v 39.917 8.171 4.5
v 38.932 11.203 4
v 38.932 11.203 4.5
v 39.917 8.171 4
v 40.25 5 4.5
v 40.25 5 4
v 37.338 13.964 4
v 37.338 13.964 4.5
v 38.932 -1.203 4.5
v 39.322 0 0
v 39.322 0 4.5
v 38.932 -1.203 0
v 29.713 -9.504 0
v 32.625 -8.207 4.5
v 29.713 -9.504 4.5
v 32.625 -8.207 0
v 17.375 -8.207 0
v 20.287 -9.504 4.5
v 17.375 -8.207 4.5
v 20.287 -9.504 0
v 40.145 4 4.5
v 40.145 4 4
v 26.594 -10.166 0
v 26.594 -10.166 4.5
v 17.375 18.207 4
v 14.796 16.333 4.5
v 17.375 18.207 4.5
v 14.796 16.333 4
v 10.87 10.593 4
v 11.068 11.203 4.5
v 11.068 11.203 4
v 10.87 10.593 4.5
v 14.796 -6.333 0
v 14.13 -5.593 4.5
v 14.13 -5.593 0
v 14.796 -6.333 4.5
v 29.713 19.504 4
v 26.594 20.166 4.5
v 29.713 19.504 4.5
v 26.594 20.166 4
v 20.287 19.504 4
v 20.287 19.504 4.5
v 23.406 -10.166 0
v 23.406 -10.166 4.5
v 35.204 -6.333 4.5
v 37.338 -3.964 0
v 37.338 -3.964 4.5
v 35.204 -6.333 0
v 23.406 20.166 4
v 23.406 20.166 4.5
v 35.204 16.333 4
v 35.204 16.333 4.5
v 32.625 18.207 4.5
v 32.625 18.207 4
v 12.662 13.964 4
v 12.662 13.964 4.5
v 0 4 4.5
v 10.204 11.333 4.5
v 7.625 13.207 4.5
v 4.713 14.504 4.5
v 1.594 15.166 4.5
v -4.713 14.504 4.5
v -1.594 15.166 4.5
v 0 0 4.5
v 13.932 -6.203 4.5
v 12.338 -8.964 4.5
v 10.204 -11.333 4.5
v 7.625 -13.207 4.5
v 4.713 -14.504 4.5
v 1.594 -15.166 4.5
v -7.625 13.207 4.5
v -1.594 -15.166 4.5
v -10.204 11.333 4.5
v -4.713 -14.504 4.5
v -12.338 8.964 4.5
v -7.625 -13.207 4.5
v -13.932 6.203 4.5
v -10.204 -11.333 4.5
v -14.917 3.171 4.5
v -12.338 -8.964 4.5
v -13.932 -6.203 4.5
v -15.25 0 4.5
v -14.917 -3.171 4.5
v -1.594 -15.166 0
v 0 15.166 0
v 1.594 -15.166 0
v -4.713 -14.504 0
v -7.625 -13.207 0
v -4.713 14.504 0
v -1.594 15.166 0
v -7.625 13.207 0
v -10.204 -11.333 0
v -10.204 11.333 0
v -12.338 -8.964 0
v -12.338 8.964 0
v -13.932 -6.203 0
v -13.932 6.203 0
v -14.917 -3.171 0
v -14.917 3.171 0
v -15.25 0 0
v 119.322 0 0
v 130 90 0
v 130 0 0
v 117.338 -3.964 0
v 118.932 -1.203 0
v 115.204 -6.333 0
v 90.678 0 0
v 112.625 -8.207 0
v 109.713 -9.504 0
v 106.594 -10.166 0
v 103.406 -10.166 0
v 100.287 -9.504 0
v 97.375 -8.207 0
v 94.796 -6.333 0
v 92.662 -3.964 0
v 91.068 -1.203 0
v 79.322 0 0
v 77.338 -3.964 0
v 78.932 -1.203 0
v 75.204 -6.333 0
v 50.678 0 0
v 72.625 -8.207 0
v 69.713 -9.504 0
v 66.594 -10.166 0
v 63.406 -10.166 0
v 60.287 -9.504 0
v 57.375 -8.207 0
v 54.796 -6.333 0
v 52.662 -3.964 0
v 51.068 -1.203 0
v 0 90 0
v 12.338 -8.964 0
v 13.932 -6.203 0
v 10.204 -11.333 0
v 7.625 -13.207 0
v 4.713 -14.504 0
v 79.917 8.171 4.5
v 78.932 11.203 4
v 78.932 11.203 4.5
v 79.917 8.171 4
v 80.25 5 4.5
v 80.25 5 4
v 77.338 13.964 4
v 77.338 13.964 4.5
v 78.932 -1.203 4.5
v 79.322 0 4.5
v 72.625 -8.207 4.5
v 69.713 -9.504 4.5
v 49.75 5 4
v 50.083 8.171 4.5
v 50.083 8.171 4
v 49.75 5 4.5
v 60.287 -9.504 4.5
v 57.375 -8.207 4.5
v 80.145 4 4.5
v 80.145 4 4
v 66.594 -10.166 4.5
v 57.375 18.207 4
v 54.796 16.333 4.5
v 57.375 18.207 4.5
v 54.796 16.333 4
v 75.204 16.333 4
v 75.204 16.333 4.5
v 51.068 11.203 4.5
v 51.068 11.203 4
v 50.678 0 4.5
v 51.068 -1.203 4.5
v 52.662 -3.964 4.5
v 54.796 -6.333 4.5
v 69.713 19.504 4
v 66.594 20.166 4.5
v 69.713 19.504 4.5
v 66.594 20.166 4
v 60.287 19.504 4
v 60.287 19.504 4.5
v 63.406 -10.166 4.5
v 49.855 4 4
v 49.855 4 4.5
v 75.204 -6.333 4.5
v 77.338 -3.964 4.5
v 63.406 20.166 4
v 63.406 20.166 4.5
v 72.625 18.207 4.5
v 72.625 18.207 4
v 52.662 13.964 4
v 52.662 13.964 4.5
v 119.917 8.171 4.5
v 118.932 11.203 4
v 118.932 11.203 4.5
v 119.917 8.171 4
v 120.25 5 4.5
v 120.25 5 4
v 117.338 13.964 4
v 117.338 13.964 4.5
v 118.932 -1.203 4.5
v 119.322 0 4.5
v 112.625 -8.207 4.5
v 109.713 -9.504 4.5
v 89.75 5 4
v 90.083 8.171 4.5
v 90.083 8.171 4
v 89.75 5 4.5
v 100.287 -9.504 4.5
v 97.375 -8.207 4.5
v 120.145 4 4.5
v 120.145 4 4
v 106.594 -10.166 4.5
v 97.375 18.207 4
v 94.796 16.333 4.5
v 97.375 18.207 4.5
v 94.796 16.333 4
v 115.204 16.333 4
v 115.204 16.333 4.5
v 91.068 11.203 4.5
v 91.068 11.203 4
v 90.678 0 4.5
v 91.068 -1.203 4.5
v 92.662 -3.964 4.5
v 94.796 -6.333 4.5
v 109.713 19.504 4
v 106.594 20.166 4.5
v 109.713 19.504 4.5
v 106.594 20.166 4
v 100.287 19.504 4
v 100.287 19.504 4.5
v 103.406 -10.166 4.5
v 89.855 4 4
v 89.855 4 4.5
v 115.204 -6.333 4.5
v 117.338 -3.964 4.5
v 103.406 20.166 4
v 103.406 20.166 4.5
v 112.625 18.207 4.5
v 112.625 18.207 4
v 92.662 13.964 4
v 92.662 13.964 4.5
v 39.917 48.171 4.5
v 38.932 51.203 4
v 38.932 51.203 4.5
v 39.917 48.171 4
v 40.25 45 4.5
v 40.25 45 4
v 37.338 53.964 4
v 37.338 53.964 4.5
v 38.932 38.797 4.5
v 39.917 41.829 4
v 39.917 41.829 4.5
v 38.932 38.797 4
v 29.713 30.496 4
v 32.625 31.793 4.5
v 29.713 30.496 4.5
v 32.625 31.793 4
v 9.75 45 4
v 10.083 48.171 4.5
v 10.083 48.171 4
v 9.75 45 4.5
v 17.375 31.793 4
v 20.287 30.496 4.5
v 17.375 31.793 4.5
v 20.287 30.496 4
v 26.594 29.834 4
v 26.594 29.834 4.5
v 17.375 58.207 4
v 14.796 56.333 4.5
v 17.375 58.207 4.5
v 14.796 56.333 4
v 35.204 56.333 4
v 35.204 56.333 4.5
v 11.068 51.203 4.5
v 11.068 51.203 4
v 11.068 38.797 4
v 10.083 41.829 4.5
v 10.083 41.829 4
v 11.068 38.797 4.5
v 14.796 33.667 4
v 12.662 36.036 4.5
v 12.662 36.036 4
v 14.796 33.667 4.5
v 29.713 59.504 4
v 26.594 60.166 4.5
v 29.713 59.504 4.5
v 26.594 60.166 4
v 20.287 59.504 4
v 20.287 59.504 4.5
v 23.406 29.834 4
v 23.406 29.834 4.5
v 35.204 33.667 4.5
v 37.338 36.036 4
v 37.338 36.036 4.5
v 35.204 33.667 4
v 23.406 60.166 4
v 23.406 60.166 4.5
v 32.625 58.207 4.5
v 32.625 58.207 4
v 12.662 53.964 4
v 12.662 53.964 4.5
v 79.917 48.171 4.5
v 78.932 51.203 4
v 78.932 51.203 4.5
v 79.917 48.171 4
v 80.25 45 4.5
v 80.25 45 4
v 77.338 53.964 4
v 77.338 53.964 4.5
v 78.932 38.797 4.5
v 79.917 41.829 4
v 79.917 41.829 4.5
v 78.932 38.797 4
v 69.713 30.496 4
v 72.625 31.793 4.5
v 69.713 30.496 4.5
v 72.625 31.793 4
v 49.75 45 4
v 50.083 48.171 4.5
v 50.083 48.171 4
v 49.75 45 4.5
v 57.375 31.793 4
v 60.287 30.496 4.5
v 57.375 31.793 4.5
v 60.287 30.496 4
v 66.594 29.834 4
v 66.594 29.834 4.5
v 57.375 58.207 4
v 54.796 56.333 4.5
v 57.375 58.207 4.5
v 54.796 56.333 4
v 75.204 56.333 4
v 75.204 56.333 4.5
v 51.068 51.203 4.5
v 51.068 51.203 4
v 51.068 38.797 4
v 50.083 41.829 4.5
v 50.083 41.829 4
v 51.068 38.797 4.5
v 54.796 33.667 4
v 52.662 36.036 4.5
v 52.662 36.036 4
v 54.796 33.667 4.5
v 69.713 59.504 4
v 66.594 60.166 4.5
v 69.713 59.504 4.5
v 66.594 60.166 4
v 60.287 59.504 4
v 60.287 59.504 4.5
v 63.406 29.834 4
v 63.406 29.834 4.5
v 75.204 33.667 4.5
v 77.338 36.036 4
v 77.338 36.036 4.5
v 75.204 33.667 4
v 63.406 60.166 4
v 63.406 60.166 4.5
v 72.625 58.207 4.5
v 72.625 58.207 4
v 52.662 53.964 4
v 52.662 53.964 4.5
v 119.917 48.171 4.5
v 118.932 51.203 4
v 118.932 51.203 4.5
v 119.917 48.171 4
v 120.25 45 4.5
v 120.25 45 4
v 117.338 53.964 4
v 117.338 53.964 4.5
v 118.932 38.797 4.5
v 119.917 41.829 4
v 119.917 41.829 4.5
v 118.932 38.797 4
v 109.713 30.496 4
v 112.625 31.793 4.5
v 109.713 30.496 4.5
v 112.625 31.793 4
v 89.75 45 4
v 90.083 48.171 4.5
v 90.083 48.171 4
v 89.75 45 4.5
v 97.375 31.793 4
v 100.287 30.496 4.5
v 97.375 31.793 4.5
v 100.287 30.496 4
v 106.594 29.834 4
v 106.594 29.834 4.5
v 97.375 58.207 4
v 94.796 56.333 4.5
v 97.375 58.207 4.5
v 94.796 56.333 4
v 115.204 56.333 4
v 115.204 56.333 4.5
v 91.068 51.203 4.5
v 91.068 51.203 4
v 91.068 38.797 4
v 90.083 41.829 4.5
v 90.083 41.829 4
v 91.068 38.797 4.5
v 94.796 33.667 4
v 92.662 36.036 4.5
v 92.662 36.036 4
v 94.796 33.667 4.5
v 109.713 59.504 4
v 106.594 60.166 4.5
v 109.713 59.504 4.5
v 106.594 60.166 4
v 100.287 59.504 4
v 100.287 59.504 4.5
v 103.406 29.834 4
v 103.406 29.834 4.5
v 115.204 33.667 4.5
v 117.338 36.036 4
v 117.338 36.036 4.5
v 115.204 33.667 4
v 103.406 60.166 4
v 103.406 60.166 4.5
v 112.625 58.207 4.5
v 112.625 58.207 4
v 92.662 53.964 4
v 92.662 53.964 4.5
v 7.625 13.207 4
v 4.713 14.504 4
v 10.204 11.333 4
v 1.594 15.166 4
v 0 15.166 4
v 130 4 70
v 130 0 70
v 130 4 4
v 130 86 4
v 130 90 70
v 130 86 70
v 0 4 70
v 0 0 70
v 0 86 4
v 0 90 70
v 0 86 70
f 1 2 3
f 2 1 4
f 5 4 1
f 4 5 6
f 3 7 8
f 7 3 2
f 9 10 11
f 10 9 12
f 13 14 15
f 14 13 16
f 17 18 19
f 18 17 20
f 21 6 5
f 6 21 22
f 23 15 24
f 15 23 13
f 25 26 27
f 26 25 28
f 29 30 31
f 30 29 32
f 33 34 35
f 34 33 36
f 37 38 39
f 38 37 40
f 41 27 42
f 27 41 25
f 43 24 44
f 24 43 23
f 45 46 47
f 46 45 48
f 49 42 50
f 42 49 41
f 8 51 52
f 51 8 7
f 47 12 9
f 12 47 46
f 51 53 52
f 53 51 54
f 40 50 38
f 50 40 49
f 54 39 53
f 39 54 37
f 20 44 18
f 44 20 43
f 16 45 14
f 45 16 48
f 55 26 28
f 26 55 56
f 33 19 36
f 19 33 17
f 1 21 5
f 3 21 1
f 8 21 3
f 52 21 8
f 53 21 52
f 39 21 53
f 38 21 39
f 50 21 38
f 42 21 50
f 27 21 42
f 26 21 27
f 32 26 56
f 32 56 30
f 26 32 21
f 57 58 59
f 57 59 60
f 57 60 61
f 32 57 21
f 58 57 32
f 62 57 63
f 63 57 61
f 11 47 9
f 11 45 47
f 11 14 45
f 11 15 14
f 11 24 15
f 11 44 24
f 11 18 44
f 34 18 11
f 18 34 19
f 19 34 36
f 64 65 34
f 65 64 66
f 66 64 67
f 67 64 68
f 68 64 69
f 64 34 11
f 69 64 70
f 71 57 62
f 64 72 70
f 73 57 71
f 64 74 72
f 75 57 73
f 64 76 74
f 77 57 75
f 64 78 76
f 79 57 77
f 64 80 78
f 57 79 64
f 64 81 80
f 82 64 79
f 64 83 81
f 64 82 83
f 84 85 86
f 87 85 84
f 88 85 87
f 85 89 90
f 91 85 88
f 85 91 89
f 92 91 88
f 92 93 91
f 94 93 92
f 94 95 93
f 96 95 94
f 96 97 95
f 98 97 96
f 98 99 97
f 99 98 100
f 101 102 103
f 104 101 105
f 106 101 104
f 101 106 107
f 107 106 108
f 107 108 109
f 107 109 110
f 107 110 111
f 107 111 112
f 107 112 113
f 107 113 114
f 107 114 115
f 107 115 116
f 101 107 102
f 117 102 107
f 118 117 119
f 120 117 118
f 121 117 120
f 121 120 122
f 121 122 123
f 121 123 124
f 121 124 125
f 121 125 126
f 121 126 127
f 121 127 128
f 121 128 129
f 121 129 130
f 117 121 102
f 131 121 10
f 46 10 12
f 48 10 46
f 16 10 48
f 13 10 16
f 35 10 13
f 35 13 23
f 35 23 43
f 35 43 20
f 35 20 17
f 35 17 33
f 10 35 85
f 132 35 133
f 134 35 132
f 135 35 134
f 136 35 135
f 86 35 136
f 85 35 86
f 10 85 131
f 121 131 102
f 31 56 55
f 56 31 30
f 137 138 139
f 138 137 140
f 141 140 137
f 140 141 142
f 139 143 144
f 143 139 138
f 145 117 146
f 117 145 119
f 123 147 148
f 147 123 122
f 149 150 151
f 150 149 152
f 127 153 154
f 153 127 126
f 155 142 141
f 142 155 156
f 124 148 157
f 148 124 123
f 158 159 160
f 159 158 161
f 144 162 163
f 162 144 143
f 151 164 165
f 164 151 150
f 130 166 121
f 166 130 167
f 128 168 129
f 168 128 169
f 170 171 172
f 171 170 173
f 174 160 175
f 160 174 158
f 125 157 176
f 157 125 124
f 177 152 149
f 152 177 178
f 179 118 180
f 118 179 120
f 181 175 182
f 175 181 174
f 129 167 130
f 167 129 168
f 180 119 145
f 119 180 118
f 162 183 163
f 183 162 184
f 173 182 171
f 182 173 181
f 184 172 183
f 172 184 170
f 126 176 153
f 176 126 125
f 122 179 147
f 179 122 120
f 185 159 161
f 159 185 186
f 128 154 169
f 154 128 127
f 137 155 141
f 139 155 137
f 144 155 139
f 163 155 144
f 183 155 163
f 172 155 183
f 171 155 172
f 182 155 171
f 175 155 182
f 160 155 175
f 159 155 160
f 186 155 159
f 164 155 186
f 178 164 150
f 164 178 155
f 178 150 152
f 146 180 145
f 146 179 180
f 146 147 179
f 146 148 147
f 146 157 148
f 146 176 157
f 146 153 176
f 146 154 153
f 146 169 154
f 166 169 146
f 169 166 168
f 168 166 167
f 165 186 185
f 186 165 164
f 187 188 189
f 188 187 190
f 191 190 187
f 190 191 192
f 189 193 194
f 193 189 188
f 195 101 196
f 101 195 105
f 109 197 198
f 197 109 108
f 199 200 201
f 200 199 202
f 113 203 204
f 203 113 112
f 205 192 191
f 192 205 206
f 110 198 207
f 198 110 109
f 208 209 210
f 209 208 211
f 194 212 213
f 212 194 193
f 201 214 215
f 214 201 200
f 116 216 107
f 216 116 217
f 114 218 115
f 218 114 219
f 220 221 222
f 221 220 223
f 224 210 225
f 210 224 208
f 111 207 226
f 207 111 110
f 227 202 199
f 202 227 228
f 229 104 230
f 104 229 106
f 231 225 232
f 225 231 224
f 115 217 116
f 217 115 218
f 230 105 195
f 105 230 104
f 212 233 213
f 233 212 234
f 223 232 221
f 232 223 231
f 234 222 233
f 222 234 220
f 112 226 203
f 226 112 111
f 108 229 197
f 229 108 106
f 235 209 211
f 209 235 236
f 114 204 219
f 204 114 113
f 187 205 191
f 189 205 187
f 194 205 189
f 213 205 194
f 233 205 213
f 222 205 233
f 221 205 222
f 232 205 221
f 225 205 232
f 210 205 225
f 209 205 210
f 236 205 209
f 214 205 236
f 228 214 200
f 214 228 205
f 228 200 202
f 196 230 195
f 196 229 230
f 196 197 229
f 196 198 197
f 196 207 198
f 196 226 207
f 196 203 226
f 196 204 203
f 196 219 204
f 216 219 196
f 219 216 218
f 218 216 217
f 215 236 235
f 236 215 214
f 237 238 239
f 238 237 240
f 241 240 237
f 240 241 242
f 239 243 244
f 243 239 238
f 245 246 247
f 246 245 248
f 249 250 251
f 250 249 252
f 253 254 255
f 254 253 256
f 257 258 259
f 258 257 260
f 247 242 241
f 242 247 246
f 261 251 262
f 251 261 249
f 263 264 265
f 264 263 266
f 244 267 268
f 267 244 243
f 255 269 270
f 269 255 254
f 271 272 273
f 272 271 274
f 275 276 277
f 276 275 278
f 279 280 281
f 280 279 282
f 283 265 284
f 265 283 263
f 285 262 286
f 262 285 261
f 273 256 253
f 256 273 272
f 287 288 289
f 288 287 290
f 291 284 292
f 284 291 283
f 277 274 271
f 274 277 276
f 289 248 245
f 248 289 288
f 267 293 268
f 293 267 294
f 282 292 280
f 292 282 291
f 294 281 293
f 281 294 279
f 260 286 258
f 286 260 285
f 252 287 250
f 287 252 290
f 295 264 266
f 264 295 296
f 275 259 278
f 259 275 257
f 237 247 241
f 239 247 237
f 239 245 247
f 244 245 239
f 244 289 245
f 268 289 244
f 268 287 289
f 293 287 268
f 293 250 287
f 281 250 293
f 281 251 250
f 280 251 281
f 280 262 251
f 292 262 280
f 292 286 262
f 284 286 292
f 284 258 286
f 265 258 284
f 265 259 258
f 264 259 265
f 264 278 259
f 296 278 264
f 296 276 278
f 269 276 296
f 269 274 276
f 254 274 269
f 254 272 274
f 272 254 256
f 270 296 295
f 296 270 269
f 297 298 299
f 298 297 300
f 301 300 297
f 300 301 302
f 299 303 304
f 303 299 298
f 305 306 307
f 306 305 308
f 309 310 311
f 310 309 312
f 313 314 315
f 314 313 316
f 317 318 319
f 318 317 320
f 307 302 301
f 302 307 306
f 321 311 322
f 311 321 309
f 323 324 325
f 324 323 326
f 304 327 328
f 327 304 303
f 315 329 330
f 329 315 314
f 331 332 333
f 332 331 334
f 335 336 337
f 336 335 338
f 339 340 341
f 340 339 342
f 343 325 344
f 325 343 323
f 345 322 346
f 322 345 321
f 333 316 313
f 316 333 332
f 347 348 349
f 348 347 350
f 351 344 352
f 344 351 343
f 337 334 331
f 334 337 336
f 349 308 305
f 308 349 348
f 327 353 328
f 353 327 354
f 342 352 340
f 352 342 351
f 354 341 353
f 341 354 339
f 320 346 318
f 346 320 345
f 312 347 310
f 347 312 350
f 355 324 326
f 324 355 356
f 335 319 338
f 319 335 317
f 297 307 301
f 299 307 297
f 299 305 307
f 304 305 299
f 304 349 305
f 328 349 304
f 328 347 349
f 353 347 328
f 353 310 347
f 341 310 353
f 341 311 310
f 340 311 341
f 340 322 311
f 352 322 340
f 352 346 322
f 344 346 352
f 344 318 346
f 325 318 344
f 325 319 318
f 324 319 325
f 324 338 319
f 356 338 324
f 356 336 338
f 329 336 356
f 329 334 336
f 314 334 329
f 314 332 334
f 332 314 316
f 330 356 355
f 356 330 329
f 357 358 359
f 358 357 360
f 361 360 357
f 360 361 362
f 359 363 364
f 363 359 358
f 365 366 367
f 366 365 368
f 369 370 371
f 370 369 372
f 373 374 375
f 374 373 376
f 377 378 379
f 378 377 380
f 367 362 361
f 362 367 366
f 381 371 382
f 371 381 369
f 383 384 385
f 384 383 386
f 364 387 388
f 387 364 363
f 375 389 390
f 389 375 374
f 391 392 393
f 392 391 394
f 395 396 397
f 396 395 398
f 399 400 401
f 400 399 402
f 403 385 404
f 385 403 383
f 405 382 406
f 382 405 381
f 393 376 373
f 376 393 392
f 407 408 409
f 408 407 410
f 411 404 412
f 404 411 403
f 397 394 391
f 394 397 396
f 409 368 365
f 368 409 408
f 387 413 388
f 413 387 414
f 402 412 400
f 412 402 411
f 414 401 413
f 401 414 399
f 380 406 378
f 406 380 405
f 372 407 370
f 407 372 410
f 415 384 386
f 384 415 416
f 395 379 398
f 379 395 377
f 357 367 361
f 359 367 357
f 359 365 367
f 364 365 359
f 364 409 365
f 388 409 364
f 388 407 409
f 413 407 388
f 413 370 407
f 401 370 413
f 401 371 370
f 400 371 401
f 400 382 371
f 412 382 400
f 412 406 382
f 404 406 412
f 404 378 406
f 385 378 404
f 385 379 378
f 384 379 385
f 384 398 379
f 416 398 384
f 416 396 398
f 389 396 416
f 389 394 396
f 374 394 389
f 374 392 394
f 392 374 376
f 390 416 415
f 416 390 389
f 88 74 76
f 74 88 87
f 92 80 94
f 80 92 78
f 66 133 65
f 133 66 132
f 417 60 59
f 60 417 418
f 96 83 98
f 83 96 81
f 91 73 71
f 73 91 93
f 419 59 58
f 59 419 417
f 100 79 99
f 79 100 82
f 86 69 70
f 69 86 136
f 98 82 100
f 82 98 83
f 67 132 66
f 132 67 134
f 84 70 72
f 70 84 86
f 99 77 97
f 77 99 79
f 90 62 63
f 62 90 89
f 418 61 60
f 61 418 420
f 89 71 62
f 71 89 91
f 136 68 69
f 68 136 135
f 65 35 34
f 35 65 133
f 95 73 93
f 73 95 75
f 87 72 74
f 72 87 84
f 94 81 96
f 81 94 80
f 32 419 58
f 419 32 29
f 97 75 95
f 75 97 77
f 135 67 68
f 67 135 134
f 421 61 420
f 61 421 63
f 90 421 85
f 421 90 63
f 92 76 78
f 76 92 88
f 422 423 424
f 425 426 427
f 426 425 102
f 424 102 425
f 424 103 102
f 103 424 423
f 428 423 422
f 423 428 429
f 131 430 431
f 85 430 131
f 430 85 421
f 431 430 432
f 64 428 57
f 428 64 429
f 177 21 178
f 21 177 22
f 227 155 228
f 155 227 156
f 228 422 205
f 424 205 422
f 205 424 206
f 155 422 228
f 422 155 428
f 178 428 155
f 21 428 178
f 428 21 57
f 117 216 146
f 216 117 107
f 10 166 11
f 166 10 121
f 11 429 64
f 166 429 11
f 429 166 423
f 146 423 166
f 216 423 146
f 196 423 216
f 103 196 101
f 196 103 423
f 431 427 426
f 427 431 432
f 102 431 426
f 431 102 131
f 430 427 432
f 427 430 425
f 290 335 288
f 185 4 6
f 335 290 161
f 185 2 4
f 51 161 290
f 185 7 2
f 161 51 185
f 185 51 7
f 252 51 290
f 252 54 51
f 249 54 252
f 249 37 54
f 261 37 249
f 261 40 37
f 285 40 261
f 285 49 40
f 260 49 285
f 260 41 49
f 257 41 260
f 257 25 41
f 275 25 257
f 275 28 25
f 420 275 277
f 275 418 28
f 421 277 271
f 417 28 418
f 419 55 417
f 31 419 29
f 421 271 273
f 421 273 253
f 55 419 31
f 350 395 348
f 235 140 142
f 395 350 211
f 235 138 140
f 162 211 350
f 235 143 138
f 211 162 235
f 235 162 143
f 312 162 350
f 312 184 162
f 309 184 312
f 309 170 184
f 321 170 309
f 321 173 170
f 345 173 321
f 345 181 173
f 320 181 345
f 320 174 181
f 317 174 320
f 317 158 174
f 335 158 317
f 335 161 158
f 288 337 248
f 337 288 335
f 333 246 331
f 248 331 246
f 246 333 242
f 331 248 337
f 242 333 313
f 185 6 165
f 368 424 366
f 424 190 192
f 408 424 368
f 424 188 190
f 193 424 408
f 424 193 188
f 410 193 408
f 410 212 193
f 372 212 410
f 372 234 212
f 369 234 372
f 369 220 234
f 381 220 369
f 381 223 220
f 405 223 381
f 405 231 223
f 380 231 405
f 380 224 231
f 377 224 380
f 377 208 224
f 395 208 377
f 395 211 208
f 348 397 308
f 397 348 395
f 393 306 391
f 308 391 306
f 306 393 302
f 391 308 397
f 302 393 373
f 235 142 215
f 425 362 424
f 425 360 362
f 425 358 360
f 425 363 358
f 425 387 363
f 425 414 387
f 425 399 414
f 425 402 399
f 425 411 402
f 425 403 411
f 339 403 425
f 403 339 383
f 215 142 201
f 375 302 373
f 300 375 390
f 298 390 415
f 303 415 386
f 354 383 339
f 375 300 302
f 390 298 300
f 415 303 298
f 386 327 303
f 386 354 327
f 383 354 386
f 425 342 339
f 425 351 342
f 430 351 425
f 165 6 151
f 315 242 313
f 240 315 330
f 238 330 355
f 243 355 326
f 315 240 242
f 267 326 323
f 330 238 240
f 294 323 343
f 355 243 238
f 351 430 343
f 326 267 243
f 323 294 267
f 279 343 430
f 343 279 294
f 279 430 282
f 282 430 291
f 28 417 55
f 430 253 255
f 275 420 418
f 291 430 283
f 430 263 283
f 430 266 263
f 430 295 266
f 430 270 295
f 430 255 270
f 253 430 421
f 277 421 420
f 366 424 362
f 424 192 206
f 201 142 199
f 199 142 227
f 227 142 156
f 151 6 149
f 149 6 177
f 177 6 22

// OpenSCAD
// Dimensions for the Falcon tube rack design

// Plate dimensions
plate_x = 130; // Length of the plate (X-axis) in mm
plate_y = 90;  // Width of the plate (Y-axis) in mm
plate_thickness = 4; // Thickness of the base plate (Z-dimension at z=0)

// Hole dimensions
hole_diameter = 30.5; // Diameter of the through-holes in mm
hole_spacing = 40;    // Center-to-center spacing for holes in both X and Y directions in mm

// Wall dimensions
wall_length = plate_x; // Length of the side walls (X-dimension)
wall_thickness = 4;   // Thickness of the side walls (Y-dimension)
wall_height = 70;     // Height of the side walls from z=0 to z=70

// Clearance for cutting operations
clearance = 0.5; // Small offset for cuts

// --- Base Plate ---
module base_plate() {
    cube([plate_x, plate_y, plate_thickness]);
}

// --- Through Holes ---
module through_holes() {
    // Calculate positions for the holes based on center-to-center spacing
    // We need 3 holes along X and 2 rows along Y.
    // The centers should be spaced by hole_spacing (40mm).

    // X positions: Center at plate_x/2, then offset by +/- hole_spacing
    x_positions = [
        plate_x / 2 - hole_spacing,
        plate_x / 2,
        plate_x / 2 + hole_spacing
    ];

    // Y positions: Center at plate_y/2, then offset by +/- hole_spacing
    y_positions = [
        plate_y / 2 - hole_spacing,
        plate_y / 2
    ];

    for (i = [0 : 2]) { // Iterate through the two rows along Y
        for (j = [0 : 2]) { // Iterate through the three columns along X
            // Calculate center coordinates for the hole
            hole_center_x = x_positions[j];
            hole_center_y = y_positions[i];

            translate([hole_center_x, hole_center_y, 0]) {
                cylinder(r = hole_diameter / 2, h = plate_thickness + clearance); // Hole goes through the plate thickness
            }
        }
    }
}

// --- Side Walls ---
module side_walls() {
    // Wall along the long edge at Y=0 (or near it)
    translate([0, 0, 0]) {
        cube([wall_length, wall_thickness, wall_height]);
    }

    // Wall along the long edge at Y=plate_y (or near it)
    translate([0, plate_y - wall_thickness, 0]) {
        cube([wall_length, wall_thickness, wall_height]);
    }
}

// --- Main Assembly ---
module falcon_rack() {
    // 1. Base Plate (at z=0 to z=plate_thickness)
    base_plate();

    // 2. Through Holes (cut through the plate)
    through_holes();

    // 3. Side Walls (rises from the plate to z=70)
    side_walls();
}

falcon_rack();
